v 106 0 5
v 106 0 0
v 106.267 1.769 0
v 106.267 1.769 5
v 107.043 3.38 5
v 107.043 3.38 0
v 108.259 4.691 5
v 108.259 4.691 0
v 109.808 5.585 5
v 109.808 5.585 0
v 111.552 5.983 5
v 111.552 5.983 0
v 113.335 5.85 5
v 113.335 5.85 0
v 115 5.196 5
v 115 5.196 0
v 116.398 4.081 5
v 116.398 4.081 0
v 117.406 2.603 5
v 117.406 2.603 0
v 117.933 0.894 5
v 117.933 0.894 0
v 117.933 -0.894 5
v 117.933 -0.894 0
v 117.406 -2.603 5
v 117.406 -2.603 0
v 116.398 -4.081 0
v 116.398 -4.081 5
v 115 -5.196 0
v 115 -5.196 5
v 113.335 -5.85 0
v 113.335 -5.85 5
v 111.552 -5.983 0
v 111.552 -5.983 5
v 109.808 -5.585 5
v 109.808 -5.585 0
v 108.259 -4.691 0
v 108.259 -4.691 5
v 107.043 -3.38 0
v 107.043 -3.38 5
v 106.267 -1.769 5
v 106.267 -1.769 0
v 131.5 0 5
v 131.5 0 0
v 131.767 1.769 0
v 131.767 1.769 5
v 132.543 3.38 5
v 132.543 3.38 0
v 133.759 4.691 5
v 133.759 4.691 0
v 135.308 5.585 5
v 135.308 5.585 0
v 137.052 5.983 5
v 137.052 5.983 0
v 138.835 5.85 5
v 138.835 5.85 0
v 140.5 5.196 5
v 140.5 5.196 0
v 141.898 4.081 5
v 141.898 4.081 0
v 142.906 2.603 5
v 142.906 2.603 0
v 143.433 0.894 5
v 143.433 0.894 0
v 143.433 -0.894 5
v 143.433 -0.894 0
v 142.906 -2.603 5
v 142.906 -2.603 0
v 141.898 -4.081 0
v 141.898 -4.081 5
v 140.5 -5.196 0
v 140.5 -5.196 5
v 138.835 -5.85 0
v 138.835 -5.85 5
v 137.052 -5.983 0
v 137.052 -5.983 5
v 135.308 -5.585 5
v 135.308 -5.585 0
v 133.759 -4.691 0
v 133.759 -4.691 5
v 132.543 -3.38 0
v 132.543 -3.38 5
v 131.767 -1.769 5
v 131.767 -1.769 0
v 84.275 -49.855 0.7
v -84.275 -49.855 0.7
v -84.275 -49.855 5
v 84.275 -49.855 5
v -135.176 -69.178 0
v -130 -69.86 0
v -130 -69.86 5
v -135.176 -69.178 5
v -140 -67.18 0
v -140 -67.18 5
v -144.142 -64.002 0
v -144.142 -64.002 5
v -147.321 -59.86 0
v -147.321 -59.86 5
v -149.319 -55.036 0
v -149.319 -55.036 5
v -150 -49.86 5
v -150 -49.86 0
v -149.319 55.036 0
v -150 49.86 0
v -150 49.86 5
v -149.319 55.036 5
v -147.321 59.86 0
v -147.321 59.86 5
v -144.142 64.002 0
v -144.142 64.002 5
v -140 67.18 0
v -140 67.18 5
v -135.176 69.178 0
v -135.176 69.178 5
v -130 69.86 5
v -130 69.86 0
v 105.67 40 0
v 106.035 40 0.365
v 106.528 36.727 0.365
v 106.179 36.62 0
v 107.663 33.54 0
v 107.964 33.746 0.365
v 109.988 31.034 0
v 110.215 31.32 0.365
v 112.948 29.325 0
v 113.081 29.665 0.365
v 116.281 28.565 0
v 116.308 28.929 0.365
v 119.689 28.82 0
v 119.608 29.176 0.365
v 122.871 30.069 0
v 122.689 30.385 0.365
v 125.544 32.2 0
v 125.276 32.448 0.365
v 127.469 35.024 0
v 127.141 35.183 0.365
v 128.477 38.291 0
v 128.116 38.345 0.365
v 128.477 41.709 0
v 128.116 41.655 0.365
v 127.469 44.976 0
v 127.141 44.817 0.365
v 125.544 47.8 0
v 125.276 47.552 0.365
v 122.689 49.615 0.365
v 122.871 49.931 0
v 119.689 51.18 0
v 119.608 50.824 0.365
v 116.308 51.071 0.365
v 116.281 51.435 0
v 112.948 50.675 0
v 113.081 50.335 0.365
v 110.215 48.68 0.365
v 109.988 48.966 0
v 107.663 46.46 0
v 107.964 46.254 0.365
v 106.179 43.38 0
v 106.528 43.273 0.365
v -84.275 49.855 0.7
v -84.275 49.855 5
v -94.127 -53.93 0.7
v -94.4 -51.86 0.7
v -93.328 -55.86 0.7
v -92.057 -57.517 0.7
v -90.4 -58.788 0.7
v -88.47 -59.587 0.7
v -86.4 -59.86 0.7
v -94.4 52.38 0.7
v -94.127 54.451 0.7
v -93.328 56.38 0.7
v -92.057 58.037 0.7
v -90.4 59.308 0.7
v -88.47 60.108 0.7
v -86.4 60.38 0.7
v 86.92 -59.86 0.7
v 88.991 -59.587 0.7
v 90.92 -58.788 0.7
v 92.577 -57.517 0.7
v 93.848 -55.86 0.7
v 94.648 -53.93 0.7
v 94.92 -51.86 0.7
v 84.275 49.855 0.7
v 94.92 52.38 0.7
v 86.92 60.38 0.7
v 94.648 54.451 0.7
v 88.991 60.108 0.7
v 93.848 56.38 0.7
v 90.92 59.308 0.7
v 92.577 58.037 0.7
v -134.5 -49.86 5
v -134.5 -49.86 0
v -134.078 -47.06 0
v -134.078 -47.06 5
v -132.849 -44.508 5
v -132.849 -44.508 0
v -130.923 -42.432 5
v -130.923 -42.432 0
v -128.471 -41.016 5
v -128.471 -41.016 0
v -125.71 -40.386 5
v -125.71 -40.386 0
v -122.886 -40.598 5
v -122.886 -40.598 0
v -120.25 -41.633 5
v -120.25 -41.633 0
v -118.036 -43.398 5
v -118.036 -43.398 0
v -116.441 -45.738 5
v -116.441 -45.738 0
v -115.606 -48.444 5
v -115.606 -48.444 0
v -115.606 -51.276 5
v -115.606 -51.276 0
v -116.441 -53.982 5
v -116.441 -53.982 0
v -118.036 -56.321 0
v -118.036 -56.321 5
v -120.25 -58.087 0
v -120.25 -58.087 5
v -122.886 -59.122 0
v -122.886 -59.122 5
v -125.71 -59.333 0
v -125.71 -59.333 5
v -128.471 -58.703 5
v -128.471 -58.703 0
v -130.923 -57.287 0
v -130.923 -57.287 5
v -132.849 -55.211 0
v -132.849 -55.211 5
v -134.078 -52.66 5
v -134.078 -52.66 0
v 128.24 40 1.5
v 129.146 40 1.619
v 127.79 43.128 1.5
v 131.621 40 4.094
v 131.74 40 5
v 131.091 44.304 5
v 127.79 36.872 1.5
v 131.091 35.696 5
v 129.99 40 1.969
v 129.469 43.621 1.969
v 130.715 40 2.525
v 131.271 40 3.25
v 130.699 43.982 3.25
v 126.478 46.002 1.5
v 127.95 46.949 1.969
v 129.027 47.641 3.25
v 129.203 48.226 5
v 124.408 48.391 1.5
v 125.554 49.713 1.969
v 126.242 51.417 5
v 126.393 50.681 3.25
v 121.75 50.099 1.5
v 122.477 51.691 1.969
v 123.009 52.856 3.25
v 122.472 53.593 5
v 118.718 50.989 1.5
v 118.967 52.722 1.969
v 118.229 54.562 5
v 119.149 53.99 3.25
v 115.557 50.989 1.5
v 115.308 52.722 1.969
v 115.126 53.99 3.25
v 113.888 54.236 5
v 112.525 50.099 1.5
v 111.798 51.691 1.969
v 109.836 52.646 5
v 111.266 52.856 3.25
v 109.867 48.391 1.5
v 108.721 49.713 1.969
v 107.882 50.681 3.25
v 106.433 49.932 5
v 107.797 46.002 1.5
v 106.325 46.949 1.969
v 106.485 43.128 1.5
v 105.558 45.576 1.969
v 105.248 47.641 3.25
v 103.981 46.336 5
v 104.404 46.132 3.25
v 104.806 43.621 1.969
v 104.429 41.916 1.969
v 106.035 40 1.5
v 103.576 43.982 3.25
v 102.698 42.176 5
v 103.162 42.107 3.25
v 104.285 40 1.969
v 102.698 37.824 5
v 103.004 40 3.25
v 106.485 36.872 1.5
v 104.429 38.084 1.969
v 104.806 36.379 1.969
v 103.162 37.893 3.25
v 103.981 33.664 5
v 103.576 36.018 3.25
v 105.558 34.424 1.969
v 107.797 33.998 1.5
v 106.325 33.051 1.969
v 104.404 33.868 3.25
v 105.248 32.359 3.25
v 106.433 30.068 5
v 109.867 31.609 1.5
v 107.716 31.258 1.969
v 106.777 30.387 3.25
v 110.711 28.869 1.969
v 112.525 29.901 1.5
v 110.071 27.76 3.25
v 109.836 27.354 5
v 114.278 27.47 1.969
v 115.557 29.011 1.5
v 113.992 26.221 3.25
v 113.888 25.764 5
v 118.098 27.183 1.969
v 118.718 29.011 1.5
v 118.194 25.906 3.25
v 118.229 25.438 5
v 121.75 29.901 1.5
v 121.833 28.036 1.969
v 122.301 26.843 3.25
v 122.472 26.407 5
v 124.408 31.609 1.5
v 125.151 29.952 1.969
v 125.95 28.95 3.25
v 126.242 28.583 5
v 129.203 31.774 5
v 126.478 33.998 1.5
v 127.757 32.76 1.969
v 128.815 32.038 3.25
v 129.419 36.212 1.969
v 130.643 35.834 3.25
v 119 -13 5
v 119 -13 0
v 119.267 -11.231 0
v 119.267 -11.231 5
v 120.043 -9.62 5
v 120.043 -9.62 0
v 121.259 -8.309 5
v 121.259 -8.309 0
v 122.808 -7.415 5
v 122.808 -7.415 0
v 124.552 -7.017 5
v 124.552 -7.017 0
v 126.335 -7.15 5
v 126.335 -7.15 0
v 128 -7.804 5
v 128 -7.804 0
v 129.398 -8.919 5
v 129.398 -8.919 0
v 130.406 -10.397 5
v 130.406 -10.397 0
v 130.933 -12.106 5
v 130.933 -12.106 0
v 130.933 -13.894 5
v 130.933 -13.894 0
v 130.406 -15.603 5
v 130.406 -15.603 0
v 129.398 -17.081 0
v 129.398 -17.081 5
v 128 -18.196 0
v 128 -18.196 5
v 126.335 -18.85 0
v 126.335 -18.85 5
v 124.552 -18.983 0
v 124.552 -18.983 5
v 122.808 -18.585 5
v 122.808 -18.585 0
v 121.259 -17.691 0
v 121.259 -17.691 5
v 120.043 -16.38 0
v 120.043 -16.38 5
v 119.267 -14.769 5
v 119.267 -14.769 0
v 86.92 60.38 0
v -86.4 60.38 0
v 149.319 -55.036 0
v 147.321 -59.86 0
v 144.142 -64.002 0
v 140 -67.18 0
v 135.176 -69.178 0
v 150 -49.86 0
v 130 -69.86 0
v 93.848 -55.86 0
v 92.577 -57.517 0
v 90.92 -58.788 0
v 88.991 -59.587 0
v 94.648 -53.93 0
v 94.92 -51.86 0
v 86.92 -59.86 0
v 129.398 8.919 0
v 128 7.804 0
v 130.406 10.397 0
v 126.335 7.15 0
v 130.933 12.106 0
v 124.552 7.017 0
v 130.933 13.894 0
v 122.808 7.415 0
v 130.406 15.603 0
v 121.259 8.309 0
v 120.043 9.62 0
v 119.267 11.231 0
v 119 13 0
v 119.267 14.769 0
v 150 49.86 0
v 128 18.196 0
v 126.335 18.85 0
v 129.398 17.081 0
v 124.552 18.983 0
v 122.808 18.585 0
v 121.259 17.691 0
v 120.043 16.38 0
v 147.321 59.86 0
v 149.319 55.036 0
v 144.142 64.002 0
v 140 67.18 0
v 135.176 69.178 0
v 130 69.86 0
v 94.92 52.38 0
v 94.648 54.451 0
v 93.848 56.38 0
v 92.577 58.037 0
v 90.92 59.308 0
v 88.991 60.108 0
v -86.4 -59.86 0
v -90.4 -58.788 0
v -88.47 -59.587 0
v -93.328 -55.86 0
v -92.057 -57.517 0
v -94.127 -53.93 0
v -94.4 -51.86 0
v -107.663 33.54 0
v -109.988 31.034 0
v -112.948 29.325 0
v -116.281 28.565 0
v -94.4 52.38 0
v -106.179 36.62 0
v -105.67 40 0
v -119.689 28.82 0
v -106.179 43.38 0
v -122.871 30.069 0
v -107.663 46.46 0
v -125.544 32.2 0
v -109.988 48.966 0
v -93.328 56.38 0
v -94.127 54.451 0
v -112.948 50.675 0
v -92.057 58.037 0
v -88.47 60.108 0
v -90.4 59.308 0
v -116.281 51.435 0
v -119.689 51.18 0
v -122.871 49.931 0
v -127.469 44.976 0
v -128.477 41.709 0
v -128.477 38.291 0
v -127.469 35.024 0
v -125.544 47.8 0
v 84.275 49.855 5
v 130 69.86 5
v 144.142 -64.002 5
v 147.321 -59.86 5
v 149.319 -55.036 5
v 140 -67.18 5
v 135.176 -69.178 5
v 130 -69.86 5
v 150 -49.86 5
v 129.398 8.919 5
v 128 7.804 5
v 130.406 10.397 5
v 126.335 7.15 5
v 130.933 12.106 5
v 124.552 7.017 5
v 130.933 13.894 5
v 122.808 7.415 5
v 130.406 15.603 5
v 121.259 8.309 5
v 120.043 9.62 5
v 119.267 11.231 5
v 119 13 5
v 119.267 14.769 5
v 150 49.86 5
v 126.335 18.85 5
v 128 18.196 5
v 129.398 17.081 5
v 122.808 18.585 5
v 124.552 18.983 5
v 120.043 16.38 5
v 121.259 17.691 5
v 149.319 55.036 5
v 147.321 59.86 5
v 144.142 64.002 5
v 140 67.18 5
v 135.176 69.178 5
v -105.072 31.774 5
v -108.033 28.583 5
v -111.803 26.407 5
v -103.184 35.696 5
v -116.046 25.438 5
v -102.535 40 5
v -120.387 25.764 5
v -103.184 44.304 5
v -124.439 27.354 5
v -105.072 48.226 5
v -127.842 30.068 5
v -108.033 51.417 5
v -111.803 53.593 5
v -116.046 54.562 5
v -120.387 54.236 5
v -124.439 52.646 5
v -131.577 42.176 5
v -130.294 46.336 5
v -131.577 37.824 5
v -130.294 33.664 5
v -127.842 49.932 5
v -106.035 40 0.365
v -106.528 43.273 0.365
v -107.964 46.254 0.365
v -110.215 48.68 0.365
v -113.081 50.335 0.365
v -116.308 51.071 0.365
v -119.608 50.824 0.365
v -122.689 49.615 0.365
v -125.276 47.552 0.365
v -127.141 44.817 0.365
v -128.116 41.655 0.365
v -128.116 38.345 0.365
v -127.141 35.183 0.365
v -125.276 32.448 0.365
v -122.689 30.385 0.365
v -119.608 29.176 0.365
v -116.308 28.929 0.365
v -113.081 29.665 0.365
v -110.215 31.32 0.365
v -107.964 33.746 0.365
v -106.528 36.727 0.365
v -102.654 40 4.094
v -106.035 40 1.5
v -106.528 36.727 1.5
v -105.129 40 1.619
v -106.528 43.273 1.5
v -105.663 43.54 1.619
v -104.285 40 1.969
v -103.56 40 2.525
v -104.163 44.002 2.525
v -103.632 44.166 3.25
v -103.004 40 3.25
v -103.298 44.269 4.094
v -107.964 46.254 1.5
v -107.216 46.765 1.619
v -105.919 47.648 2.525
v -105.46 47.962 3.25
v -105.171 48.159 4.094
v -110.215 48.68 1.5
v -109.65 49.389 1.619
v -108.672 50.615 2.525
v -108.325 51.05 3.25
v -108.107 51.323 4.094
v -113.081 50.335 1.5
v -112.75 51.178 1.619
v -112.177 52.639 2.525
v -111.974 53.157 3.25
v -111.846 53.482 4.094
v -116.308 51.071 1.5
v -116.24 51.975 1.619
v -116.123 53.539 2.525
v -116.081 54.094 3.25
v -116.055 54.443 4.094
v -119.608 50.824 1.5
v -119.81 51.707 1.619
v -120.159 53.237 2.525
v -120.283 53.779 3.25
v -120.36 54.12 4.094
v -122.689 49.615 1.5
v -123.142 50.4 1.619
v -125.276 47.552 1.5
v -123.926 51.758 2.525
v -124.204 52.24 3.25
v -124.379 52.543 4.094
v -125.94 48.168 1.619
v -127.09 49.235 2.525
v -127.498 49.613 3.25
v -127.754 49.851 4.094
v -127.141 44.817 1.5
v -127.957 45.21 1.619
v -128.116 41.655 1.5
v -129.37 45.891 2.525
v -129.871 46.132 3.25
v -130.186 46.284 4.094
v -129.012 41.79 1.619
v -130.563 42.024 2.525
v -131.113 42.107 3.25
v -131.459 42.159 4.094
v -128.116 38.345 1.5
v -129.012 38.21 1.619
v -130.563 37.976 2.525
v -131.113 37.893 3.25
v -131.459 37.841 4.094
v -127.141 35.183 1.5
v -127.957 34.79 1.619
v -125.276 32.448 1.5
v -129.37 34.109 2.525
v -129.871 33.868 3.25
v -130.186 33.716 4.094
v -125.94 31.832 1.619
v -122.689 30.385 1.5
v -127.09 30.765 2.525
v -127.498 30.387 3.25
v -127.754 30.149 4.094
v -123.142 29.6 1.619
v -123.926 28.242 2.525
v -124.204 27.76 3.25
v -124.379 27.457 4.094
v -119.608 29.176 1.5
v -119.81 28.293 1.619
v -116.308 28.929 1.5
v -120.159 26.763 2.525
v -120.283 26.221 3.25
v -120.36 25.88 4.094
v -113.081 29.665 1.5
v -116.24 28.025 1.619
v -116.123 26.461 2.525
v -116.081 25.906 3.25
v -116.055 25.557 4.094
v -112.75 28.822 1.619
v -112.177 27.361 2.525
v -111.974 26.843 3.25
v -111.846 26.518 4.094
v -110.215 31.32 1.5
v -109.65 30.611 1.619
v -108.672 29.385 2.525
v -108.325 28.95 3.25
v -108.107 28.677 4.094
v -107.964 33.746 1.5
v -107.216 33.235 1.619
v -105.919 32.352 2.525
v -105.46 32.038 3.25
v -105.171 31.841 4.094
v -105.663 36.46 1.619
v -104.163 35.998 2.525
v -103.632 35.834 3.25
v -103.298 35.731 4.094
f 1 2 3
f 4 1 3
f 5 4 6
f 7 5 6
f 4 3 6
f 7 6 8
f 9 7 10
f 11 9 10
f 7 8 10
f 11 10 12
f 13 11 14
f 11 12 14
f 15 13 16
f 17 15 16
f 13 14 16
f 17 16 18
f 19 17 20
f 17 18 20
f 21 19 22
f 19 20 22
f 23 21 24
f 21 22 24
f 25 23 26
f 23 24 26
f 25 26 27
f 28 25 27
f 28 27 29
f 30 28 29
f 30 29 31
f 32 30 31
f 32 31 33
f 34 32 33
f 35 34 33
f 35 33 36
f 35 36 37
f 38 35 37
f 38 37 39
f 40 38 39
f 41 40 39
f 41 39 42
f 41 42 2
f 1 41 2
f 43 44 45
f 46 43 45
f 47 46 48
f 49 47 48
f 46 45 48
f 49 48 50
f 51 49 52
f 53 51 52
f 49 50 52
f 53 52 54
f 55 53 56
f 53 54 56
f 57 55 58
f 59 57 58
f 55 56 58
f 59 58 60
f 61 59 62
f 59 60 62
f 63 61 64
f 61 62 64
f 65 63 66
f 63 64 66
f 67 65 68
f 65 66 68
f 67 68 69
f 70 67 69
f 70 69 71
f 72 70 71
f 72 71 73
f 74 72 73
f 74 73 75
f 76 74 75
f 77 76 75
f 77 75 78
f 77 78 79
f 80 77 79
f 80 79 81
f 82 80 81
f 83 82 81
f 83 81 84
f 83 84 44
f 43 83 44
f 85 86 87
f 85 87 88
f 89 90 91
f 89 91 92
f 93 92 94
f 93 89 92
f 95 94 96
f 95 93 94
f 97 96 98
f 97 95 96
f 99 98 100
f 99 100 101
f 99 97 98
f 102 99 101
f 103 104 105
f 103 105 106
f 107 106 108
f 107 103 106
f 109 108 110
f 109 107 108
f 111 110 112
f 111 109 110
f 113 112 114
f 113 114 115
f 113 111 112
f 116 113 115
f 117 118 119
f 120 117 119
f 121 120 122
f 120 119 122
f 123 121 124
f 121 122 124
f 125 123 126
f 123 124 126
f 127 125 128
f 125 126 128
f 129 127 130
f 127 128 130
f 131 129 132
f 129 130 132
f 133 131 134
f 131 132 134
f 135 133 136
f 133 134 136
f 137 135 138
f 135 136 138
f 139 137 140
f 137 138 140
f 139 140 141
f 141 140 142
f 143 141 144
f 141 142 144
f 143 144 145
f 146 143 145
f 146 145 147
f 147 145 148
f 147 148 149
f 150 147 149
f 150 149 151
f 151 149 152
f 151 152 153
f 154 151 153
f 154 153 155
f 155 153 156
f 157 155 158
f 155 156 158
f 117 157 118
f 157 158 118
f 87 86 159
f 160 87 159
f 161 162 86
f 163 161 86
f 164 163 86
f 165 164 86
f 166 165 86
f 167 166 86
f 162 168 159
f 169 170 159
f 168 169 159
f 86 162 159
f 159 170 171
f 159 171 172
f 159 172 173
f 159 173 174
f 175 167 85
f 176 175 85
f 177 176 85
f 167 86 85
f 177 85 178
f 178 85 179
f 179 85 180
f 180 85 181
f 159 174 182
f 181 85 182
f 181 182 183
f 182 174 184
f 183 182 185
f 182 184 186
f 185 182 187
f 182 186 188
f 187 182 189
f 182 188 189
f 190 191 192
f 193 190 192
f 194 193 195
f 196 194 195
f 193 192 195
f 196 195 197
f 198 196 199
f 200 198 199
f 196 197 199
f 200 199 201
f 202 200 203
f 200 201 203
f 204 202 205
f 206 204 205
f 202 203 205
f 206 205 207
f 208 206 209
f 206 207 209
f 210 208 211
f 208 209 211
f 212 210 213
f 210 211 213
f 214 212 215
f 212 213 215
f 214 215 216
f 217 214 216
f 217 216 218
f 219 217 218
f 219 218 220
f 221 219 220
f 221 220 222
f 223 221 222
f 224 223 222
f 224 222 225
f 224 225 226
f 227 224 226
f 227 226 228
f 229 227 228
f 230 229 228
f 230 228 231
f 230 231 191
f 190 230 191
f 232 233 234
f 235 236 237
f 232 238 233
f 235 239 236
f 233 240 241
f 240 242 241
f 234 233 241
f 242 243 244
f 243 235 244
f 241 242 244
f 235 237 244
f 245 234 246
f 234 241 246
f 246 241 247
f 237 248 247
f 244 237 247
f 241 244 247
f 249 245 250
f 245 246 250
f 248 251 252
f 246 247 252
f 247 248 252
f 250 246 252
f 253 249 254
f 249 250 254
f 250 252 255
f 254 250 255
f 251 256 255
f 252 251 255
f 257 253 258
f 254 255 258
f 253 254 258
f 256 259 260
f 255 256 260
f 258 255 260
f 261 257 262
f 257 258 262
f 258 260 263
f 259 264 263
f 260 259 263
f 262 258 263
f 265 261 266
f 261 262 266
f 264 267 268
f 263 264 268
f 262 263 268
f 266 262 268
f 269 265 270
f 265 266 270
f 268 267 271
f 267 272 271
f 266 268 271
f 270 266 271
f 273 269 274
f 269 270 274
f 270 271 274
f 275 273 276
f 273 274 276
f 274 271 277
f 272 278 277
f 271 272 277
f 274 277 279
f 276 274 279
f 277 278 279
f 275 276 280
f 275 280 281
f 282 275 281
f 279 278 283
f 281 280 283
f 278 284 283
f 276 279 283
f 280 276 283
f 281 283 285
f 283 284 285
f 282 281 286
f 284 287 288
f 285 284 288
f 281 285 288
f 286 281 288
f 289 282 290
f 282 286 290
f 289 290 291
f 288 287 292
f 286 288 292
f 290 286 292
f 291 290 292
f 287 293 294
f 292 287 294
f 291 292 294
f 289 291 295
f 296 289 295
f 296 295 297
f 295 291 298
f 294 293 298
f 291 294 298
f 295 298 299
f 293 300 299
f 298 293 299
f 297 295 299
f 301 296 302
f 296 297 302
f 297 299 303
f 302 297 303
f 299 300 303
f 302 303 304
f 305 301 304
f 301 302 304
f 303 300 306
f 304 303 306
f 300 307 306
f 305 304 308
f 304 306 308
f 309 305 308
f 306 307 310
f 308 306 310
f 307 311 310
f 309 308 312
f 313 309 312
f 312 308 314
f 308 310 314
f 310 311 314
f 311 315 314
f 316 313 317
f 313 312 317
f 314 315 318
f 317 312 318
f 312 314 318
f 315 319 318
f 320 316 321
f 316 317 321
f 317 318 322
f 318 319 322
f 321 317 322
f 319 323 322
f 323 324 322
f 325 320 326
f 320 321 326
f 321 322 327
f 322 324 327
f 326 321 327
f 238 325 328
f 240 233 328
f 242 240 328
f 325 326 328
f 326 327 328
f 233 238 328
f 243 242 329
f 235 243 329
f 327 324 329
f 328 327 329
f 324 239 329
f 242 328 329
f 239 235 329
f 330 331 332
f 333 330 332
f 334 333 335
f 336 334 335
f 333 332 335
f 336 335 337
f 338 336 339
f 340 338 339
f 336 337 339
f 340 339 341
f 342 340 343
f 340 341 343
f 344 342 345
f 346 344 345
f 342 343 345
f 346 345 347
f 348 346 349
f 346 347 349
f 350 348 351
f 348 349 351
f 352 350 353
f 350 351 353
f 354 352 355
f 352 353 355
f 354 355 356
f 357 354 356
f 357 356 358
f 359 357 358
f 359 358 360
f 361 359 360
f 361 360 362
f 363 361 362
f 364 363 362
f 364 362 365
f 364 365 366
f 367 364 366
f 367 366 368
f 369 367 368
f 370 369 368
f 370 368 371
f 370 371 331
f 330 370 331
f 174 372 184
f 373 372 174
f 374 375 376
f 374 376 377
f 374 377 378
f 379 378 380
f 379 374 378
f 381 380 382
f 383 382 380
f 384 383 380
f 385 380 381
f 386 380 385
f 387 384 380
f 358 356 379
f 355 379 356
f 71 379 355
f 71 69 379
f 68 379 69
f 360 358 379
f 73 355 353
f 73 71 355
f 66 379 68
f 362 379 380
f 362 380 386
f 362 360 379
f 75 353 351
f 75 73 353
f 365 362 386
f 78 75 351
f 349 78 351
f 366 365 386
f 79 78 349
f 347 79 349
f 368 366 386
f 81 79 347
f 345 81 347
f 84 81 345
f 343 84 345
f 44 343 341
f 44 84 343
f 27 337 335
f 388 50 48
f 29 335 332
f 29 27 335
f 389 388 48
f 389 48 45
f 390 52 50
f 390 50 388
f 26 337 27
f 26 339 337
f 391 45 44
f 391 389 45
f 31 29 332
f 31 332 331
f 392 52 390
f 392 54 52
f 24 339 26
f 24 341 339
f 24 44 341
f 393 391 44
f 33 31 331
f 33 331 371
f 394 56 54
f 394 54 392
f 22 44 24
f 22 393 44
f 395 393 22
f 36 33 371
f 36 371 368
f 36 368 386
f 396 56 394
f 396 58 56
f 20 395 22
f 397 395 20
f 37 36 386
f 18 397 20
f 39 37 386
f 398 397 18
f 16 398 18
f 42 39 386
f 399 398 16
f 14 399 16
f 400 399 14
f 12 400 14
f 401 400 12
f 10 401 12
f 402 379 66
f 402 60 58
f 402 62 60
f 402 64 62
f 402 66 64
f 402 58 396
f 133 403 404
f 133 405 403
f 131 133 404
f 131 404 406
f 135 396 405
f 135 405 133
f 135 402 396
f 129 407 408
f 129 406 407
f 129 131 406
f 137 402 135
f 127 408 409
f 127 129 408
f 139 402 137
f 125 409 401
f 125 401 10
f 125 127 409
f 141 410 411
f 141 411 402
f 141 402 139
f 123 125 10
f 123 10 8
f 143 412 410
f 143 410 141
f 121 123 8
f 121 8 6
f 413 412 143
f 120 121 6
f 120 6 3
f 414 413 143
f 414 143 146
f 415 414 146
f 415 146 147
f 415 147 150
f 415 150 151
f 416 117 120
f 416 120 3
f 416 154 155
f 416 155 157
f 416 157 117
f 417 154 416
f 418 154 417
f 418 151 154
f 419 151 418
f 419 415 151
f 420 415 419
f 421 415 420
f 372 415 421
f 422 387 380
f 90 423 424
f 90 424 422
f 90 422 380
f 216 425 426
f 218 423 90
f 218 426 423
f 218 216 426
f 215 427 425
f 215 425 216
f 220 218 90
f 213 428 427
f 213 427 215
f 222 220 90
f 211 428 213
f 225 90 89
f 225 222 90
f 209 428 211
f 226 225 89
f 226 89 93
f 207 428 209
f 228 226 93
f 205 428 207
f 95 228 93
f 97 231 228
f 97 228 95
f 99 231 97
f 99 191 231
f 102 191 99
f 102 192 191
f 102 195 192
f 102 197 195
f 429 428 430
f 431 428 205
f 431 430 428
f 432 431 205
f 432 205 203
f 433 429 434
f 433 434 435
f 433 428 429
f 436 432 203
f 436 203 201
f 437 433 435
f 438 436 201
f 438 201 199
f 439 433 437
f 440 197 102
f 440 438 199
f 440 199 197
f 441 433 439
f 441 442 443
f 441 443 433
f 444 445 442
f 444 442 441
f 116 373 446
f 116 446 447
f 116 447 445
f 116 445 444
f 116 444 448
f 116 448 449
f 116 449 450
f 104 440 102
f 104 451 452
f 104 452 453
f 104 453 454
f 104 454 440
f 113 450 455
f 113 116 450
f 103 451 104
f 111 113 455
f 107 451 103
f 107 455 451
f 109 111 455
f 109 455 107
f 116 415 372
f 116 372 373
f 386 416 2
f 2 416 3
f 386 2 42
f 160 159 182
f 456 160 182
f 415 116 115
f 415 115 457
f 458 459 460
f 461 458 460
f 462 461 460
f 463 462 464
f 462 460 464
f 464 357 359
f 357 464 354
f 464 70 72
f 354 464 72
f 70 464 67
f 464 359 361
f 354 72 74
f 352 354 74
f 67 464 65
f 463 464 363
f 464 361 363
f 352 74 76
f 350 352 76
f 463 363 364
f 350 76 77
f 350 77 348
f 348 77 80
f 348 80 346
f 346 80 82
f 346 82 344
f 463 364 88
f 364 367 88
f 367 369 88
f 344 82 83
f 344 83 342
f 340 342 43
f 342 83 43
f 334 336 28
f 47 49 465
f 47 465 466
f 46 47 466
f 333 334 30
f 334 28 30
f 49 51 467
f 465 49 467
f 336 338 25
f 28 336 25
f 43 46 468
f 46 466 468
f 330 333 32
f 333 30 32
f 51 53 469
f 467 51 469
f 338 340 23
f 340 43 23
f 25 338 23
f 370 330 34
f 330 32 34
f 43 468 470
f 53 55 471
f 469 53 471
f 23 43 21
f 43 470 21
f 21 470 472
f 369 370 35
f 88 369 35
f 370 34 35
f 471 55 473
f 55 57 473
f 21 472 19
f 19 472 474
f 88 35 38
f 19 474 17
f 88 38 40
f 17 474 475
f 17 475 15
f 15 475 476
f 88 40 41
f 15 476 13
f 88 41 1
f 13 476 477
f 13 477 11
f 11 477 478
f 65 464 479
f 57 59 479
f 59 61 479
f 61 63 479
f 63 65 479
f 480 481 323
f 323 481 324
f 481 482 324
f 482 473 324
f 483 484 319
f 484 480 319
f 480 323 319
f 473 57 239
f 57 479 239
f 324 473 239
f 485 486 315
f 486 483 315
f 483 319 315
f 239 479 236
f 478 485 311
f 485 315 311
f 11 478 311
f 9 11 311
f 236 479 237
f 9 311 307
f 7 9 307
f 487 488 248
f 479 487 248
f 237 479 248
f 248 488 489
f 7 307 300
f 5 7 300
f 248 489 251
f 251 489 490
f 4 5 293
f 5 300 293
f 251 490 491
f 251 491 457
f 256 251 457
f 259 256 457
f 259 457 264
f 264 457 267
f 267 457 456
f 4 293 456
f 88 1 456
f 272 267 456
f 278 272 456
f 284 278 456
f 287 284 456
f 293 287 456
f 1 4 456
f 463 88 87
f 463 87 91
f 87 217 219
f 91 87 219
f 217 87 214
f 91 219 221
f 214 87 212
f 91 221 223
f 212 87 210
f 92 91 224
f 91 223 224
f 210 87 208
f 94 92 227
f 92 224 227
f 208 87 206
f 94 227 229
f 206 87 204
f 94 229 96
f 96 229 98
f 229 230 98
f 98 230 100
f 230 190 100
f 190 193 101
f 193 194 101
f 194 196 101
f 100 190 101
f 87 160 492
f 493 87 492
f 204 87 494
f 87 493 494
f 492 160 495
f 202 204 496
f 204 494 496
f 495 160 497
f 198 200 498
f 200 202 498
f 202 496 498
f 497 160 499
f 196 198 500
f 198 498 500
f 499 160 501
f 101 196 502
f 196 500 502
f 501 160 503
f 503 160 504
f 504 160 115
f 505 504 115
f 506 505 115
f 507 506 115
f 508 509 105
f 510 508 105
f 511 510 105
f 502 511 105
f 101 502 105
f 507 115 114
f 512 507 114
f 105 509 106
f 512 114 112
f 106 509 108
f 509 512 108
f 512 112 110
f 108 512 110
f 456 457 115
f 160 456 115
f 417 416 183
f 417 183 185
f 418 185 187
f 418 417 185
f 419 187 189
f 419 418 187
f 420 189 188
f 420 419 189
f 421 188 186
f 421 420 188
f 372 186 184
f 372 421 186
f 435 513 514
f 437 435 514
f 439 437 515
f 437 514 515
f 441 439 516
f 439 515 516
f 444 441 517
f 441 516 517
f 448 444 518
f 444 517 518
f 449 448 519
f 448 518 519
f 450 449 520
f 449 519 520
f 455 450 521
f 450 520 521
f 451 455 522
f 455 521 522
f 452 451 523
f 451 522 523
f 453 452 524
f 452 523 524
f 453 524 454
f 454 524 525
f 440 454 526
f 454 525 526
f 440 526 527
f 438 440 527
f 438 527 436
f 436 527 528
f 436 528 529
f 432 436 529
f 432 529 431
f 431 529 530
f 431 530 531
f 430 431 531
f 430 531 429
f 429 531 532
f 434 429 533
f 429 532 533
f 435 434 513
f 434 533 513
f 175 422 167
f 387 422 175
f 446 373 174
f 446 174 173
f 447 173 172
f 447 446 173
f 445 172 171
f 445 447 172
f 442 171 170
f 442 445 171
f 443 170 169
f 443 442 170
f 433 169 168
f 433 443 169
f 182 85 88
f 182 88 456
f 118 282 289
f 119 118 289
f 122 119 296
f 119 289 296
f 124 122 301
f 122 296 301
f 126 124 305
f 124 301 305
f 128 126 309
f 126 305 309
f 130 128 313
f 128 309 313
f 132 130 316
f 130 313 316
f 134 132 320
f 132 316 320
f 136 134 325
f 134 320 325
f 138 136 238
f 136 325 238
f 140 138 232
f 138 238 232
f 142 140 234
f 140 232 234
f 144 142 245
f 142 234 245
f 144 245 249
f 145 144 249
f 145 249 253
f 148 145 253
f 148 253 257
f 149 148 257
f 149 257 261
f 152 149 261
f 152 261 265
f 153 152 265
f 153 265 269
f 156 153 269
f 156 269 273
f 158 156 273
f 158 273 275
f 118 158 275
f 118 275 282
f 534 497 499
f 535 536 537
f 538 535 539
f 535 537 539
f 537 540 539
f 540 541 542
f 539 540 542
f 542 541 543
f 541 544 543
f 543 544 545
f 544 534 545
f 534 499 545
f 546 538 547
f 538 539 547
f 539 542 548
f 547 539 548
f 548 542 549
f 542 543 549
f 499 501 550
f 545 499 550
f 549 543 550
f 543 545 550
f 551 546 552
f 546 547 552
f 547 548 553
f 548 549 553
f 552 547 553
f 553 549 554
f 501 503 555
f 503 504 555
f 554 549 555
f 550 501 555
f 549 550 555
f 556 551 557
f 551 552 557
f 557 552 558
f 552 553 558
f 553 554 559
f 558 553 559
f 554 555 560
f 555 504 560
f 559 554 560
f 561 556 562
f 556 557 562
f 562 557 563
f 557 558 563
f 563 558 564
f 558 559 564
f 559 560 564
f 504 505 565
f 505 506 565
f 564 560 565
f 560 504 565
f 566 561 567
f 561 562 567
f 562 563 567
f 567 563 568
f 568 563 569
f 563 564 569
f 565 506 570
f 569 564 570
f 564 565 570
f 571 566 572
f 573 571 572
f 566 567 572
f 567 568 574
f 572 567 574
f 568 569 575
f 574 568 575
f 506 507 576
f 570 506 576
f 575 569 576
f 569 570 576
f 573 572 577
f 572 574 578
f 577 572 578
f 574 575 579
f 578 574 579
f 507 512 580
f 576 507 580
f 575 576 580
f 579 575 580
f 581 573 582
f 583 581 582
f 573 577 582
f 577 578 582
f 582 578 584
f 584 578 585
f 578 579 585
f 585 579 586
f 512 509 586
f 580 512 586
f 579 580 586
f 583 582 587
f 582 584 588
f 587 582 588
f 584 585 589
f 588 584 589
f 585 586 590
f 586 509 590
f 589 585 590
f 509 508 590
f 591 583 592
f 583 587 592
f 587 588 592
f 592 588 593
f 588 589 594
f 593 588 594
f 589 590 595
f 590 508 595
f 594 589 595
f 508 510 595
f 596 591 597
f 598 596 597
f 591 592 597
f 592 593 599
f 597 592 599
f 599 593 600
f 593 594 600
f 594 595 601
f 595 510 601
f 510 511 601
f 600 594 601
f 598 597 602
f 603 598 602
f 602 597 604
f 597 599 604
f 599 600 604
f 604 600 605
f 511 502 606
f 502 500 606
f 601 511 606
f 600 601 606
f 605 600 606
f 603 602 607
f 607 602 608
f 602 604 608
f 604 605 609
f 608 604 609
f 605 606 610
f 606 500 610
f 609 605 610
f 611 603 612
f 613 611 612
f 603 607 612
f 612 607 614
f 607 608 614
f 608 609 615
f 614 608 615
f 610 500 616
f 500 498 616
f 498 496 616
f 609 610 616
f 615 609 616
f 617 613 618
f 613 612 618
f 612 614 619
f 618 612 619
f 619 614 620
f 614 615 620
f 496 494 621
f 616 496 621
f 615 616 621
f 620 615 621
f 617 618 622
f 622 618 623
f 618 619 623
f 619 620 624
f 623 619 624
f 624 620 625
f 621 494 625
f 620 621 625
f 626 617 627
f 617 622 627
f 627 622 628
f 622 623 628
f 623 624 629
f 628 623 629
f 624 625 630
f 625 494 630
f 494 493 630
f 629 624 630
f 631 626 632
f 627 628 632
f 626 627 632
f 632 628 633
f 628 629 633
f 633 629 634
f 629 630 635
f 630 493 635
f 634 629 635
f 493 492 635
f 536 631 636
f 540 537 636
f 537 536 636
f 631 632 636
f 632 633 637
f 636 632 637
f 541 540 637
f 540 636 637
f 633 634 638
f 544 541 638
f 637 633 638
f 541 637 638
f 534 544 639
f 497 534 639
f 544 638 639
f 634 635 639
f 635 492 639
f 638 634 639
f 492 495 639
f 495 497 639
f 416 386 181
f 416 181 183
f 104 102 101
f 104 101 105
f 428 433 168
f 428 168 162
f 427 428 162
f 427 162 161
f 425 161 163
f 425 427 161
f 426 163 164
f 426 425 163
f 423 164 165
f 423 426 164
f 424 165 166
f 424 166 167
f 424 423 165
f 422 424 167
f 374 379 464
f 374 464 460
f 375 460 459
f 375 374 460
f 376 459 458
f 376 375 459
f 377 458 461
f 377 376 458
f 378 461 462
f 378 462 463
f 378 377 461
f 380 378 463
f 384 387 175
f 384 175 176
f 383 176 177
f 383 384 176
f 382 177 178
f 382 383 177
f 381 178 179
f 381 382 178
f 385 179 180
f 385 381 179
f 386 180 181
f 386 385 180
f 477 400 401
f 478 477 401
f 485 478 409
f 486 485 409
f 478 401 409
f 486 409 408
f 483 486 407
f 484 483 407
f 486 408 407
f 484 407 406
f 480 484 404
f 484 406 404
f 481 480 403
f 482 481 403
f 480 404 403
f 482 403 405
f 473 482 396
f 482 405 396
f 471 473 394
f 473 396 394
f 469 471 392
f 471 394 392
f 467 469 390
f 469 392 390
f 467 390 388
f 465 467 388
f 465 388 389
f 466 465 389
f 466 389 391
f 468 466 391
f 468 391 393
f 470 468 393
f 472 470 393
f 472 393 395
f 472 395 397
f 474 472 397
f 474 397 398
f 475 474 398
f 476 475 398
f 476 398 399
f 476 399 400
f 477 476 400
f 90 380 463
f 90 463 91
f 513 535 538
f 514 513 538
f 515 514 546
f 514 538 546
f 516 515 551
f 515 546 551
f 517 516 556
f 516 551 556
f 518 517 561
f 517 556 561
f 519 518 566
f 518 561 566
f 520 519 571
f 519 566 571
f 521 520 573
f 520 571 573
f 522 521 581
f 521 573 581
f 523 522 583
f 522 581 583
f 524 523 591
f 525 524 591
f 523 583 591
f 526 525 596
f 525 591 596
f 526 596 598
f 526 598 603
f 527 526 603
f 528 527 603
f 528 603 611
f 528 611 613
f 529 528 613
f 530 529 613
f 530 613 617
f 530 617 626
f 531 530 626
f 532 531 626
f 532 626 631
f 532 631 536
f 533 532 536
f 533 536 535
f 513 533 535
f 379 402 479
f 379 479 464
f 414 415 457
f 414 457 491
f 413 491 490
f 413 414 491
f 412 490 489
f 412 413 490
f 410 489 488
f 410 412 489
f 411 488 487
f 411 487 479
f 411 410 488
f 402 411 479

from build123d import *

# Parameters (mm, degrees)
BOSS_EXTRUDE1_DEPTH = 5
CUT_EXTRUDE1_DEPTH  = 0.7
SKETCH7_W           = 168.55
SKETCH7_H           = 99.71
CUT_EXTRUDE2_DEPTH  = 166.54571941
SKETCH8_R           = 11.1025
CUT_EXTRUDE3_DEPTH  = 166.54571941
CHAMFER1_SIZE       = 0.365
SKETCH58_R          = 6
CUT_EXTRUDE4_DEPTH  = 166.54571941
SKETCH59_R          = 9.5
CUT_EXTRUDE5_DEPTH  = 166.54571941


# Read off the part's stored shape, not the designer's step: Cut-Sweep1, Cut-Sweep2
with BuildPart() as part:
    # Sketch1 → Boss-Extrude1 (new body)
    with BuildSketch(Plane.XY):
        with BuildLine():
            Line((-130, 69.8597539), (130, 69.8597539))
            ThreePointArc((130, 69.8597539), (144.142135624, 64.001889524), (150, 49.8597539))
            Line((150, 49.8597539), (150, -49.8597539))
            ThreePointArc((150, -49.8597539), (144.142135624, -64.001889524), (130, -69.8597539))
            Line((130, -69.8597539), (-130, -69.8597539))
            ThreePointArc((-130, -69.8597539), (-144.142135624, -64.001889524), (-150, -49.8597539))
            Line((-150, -49.8597539), (-150, 49.8597539))
            ThreePointArc((-150, 49.8597539), (-144.142135624, 64.001889524), (-130, 69.8597539))
        make_face()
    extrude(amount=BOSS_EXTRUDE1_DEPTH)

    # Sketch5 → Cut-Extrude1 (cut)
    with BuildSketch(Plane.XY):
        with BuildLine():
            Line((-94.3997539, 52.3802461), (-94.3997539, -51.8597539))
            ThreePointArc((-94.3997539, -51.8597539), (-92.05660815, -57.51660815), (-86.3997539, -59.8597539))
            Line((-86.3997539, -59.8597539), (86.9202461, -59.8597539))
            ThreePointArc((86.9202461, -59.8597539), (92.577100349, -57.51660815), (94.9202461, -51.8597539))
            Line((94.9202461, -51.8597539), (94.9202461, 52.3802461))
            ThreePointArc((94.9202461, 52.3802461), (92.577100349, 58.037100349), (86.9202461, 60.3802461))
            Line((86.9202461, 60.3802461), (-86.3997539, 60.3802461))
            ThreePointArc((-86.3997539, 60.3802461), (-92.05660815, 58.037100349), (-94.3997539, 52.3802461))
        make_face()
    extrude(amount=CUT_EXTRUDE1_DEPTH, mode=Mode.SUBTRACT)

    # Sketch7 → Cut-Extrude2 (cut, through all)
    with BuildSketch(Plane.XY):
        Rectangle(SKETCH7_W, SKETCH7_H)
    extrude(amount=CUT_EXTRUDE2_DEPTH, mode=Mode.SUBTRACT)

    # Sketch8 → Cut-Extrude3 (cut, through all)
    with BuildSketch(Plane.XY.offset(5)):
        with Locations((-117.1375, 40)):
            Circle(SKETCH8_R)
        with Locations(Location((117.1375, 40, 0), (0, 0, 180))):
            Circle(SKETCH8_R)
    extrude(amount=-CUT_EXTRUDE3_DEPTH, mode=Mode.SUBTRACT)

    # Chamfer1
    chamfer1_edges = [part.edges().sort_by_distance(p)[0] for p in [
        (-128.24, 40, 0),
        (128.24, 40, 0),
    ]]
    chamfer(chamfer1_edges, length=CHAMFER1_SIZE)

    # Cut-Sweep1 outline → Cut-Sweep1 (revolve, cut)
    with BuildSketch(Plane(origin=(-117.1375, 40, 0), x_dir=(1, 0, 0), z_dir=(0, -1, 0))):
        with BuildLine():
            Line((11.1025, 5), (11.1025, 1.5))
            ThreePointArc((11.1025, 1.5), (13.577373734, 2.525126266), (14.6025, 5))
            Line((14.6025, 5), (11.1025, 5))
        make_face()
    revolve(axis=Axis((-117.1375, 40, 0), (0, 0, 1)), mode=Mode.SUBTRACT)

    # Cut-Sweep2 outline → Cut-Sweep2 (revolve, cut)
    with BuildSketch(Plane(origin=(117.1375, 40, 0), x_dir=(1, 0, 0), z_dir=(0, -1, 0))):
        with BuildLine():
            Line((11.1025, 5), (11.1025, 1.5))
            ThreePointArc((11.1025, 1.5), (13.577373734, 2.525126266), (14.6025, 5))
            Line((14.6025, 5), (11.1025, 5))
        make_face()
    revolve(axis=Axis((117.1375, 40, 0), (0, 0, 1)), mode=Mode.SUBTRACT)

    # Sketch58 → Cut-Extrude4 (cut, through all)
    with BuildSketch(Plane(origin=(0, 0, 0), x_dir=(-1, 0, 0), z_dir=(0, 0, -1))):
        with Locations((-125, 13)):
            Circle(SKETCH58_R)
        with Locations((-112, 0)):
            Circle(SKETCH58_R)
        with Locations((-125, -13)):
            Circle(SKETCH58_R)
        with Locations((-137.5, 0)):
            Circle(SKETCH58_R)
    extrude(amount=-CUT_EXTRUDE4_DEPTH, mode=Mode.SUBTRACT)

    # Sketch59 → Cut-Extrude5 (cut, through all)
    with BuildSketch(Plane(origin=(0, 0, 0), x_dir=(-1, 0, 0), z_dir=(0, 0, -1))):
        with Locations((125, -49.8597539)):
            Circle(SKETCH59_R)
    extrude(amount=-CUT_EXTRUDE5_DEPTH, mode=Mode.SUBTRACT)


solid = part.part
